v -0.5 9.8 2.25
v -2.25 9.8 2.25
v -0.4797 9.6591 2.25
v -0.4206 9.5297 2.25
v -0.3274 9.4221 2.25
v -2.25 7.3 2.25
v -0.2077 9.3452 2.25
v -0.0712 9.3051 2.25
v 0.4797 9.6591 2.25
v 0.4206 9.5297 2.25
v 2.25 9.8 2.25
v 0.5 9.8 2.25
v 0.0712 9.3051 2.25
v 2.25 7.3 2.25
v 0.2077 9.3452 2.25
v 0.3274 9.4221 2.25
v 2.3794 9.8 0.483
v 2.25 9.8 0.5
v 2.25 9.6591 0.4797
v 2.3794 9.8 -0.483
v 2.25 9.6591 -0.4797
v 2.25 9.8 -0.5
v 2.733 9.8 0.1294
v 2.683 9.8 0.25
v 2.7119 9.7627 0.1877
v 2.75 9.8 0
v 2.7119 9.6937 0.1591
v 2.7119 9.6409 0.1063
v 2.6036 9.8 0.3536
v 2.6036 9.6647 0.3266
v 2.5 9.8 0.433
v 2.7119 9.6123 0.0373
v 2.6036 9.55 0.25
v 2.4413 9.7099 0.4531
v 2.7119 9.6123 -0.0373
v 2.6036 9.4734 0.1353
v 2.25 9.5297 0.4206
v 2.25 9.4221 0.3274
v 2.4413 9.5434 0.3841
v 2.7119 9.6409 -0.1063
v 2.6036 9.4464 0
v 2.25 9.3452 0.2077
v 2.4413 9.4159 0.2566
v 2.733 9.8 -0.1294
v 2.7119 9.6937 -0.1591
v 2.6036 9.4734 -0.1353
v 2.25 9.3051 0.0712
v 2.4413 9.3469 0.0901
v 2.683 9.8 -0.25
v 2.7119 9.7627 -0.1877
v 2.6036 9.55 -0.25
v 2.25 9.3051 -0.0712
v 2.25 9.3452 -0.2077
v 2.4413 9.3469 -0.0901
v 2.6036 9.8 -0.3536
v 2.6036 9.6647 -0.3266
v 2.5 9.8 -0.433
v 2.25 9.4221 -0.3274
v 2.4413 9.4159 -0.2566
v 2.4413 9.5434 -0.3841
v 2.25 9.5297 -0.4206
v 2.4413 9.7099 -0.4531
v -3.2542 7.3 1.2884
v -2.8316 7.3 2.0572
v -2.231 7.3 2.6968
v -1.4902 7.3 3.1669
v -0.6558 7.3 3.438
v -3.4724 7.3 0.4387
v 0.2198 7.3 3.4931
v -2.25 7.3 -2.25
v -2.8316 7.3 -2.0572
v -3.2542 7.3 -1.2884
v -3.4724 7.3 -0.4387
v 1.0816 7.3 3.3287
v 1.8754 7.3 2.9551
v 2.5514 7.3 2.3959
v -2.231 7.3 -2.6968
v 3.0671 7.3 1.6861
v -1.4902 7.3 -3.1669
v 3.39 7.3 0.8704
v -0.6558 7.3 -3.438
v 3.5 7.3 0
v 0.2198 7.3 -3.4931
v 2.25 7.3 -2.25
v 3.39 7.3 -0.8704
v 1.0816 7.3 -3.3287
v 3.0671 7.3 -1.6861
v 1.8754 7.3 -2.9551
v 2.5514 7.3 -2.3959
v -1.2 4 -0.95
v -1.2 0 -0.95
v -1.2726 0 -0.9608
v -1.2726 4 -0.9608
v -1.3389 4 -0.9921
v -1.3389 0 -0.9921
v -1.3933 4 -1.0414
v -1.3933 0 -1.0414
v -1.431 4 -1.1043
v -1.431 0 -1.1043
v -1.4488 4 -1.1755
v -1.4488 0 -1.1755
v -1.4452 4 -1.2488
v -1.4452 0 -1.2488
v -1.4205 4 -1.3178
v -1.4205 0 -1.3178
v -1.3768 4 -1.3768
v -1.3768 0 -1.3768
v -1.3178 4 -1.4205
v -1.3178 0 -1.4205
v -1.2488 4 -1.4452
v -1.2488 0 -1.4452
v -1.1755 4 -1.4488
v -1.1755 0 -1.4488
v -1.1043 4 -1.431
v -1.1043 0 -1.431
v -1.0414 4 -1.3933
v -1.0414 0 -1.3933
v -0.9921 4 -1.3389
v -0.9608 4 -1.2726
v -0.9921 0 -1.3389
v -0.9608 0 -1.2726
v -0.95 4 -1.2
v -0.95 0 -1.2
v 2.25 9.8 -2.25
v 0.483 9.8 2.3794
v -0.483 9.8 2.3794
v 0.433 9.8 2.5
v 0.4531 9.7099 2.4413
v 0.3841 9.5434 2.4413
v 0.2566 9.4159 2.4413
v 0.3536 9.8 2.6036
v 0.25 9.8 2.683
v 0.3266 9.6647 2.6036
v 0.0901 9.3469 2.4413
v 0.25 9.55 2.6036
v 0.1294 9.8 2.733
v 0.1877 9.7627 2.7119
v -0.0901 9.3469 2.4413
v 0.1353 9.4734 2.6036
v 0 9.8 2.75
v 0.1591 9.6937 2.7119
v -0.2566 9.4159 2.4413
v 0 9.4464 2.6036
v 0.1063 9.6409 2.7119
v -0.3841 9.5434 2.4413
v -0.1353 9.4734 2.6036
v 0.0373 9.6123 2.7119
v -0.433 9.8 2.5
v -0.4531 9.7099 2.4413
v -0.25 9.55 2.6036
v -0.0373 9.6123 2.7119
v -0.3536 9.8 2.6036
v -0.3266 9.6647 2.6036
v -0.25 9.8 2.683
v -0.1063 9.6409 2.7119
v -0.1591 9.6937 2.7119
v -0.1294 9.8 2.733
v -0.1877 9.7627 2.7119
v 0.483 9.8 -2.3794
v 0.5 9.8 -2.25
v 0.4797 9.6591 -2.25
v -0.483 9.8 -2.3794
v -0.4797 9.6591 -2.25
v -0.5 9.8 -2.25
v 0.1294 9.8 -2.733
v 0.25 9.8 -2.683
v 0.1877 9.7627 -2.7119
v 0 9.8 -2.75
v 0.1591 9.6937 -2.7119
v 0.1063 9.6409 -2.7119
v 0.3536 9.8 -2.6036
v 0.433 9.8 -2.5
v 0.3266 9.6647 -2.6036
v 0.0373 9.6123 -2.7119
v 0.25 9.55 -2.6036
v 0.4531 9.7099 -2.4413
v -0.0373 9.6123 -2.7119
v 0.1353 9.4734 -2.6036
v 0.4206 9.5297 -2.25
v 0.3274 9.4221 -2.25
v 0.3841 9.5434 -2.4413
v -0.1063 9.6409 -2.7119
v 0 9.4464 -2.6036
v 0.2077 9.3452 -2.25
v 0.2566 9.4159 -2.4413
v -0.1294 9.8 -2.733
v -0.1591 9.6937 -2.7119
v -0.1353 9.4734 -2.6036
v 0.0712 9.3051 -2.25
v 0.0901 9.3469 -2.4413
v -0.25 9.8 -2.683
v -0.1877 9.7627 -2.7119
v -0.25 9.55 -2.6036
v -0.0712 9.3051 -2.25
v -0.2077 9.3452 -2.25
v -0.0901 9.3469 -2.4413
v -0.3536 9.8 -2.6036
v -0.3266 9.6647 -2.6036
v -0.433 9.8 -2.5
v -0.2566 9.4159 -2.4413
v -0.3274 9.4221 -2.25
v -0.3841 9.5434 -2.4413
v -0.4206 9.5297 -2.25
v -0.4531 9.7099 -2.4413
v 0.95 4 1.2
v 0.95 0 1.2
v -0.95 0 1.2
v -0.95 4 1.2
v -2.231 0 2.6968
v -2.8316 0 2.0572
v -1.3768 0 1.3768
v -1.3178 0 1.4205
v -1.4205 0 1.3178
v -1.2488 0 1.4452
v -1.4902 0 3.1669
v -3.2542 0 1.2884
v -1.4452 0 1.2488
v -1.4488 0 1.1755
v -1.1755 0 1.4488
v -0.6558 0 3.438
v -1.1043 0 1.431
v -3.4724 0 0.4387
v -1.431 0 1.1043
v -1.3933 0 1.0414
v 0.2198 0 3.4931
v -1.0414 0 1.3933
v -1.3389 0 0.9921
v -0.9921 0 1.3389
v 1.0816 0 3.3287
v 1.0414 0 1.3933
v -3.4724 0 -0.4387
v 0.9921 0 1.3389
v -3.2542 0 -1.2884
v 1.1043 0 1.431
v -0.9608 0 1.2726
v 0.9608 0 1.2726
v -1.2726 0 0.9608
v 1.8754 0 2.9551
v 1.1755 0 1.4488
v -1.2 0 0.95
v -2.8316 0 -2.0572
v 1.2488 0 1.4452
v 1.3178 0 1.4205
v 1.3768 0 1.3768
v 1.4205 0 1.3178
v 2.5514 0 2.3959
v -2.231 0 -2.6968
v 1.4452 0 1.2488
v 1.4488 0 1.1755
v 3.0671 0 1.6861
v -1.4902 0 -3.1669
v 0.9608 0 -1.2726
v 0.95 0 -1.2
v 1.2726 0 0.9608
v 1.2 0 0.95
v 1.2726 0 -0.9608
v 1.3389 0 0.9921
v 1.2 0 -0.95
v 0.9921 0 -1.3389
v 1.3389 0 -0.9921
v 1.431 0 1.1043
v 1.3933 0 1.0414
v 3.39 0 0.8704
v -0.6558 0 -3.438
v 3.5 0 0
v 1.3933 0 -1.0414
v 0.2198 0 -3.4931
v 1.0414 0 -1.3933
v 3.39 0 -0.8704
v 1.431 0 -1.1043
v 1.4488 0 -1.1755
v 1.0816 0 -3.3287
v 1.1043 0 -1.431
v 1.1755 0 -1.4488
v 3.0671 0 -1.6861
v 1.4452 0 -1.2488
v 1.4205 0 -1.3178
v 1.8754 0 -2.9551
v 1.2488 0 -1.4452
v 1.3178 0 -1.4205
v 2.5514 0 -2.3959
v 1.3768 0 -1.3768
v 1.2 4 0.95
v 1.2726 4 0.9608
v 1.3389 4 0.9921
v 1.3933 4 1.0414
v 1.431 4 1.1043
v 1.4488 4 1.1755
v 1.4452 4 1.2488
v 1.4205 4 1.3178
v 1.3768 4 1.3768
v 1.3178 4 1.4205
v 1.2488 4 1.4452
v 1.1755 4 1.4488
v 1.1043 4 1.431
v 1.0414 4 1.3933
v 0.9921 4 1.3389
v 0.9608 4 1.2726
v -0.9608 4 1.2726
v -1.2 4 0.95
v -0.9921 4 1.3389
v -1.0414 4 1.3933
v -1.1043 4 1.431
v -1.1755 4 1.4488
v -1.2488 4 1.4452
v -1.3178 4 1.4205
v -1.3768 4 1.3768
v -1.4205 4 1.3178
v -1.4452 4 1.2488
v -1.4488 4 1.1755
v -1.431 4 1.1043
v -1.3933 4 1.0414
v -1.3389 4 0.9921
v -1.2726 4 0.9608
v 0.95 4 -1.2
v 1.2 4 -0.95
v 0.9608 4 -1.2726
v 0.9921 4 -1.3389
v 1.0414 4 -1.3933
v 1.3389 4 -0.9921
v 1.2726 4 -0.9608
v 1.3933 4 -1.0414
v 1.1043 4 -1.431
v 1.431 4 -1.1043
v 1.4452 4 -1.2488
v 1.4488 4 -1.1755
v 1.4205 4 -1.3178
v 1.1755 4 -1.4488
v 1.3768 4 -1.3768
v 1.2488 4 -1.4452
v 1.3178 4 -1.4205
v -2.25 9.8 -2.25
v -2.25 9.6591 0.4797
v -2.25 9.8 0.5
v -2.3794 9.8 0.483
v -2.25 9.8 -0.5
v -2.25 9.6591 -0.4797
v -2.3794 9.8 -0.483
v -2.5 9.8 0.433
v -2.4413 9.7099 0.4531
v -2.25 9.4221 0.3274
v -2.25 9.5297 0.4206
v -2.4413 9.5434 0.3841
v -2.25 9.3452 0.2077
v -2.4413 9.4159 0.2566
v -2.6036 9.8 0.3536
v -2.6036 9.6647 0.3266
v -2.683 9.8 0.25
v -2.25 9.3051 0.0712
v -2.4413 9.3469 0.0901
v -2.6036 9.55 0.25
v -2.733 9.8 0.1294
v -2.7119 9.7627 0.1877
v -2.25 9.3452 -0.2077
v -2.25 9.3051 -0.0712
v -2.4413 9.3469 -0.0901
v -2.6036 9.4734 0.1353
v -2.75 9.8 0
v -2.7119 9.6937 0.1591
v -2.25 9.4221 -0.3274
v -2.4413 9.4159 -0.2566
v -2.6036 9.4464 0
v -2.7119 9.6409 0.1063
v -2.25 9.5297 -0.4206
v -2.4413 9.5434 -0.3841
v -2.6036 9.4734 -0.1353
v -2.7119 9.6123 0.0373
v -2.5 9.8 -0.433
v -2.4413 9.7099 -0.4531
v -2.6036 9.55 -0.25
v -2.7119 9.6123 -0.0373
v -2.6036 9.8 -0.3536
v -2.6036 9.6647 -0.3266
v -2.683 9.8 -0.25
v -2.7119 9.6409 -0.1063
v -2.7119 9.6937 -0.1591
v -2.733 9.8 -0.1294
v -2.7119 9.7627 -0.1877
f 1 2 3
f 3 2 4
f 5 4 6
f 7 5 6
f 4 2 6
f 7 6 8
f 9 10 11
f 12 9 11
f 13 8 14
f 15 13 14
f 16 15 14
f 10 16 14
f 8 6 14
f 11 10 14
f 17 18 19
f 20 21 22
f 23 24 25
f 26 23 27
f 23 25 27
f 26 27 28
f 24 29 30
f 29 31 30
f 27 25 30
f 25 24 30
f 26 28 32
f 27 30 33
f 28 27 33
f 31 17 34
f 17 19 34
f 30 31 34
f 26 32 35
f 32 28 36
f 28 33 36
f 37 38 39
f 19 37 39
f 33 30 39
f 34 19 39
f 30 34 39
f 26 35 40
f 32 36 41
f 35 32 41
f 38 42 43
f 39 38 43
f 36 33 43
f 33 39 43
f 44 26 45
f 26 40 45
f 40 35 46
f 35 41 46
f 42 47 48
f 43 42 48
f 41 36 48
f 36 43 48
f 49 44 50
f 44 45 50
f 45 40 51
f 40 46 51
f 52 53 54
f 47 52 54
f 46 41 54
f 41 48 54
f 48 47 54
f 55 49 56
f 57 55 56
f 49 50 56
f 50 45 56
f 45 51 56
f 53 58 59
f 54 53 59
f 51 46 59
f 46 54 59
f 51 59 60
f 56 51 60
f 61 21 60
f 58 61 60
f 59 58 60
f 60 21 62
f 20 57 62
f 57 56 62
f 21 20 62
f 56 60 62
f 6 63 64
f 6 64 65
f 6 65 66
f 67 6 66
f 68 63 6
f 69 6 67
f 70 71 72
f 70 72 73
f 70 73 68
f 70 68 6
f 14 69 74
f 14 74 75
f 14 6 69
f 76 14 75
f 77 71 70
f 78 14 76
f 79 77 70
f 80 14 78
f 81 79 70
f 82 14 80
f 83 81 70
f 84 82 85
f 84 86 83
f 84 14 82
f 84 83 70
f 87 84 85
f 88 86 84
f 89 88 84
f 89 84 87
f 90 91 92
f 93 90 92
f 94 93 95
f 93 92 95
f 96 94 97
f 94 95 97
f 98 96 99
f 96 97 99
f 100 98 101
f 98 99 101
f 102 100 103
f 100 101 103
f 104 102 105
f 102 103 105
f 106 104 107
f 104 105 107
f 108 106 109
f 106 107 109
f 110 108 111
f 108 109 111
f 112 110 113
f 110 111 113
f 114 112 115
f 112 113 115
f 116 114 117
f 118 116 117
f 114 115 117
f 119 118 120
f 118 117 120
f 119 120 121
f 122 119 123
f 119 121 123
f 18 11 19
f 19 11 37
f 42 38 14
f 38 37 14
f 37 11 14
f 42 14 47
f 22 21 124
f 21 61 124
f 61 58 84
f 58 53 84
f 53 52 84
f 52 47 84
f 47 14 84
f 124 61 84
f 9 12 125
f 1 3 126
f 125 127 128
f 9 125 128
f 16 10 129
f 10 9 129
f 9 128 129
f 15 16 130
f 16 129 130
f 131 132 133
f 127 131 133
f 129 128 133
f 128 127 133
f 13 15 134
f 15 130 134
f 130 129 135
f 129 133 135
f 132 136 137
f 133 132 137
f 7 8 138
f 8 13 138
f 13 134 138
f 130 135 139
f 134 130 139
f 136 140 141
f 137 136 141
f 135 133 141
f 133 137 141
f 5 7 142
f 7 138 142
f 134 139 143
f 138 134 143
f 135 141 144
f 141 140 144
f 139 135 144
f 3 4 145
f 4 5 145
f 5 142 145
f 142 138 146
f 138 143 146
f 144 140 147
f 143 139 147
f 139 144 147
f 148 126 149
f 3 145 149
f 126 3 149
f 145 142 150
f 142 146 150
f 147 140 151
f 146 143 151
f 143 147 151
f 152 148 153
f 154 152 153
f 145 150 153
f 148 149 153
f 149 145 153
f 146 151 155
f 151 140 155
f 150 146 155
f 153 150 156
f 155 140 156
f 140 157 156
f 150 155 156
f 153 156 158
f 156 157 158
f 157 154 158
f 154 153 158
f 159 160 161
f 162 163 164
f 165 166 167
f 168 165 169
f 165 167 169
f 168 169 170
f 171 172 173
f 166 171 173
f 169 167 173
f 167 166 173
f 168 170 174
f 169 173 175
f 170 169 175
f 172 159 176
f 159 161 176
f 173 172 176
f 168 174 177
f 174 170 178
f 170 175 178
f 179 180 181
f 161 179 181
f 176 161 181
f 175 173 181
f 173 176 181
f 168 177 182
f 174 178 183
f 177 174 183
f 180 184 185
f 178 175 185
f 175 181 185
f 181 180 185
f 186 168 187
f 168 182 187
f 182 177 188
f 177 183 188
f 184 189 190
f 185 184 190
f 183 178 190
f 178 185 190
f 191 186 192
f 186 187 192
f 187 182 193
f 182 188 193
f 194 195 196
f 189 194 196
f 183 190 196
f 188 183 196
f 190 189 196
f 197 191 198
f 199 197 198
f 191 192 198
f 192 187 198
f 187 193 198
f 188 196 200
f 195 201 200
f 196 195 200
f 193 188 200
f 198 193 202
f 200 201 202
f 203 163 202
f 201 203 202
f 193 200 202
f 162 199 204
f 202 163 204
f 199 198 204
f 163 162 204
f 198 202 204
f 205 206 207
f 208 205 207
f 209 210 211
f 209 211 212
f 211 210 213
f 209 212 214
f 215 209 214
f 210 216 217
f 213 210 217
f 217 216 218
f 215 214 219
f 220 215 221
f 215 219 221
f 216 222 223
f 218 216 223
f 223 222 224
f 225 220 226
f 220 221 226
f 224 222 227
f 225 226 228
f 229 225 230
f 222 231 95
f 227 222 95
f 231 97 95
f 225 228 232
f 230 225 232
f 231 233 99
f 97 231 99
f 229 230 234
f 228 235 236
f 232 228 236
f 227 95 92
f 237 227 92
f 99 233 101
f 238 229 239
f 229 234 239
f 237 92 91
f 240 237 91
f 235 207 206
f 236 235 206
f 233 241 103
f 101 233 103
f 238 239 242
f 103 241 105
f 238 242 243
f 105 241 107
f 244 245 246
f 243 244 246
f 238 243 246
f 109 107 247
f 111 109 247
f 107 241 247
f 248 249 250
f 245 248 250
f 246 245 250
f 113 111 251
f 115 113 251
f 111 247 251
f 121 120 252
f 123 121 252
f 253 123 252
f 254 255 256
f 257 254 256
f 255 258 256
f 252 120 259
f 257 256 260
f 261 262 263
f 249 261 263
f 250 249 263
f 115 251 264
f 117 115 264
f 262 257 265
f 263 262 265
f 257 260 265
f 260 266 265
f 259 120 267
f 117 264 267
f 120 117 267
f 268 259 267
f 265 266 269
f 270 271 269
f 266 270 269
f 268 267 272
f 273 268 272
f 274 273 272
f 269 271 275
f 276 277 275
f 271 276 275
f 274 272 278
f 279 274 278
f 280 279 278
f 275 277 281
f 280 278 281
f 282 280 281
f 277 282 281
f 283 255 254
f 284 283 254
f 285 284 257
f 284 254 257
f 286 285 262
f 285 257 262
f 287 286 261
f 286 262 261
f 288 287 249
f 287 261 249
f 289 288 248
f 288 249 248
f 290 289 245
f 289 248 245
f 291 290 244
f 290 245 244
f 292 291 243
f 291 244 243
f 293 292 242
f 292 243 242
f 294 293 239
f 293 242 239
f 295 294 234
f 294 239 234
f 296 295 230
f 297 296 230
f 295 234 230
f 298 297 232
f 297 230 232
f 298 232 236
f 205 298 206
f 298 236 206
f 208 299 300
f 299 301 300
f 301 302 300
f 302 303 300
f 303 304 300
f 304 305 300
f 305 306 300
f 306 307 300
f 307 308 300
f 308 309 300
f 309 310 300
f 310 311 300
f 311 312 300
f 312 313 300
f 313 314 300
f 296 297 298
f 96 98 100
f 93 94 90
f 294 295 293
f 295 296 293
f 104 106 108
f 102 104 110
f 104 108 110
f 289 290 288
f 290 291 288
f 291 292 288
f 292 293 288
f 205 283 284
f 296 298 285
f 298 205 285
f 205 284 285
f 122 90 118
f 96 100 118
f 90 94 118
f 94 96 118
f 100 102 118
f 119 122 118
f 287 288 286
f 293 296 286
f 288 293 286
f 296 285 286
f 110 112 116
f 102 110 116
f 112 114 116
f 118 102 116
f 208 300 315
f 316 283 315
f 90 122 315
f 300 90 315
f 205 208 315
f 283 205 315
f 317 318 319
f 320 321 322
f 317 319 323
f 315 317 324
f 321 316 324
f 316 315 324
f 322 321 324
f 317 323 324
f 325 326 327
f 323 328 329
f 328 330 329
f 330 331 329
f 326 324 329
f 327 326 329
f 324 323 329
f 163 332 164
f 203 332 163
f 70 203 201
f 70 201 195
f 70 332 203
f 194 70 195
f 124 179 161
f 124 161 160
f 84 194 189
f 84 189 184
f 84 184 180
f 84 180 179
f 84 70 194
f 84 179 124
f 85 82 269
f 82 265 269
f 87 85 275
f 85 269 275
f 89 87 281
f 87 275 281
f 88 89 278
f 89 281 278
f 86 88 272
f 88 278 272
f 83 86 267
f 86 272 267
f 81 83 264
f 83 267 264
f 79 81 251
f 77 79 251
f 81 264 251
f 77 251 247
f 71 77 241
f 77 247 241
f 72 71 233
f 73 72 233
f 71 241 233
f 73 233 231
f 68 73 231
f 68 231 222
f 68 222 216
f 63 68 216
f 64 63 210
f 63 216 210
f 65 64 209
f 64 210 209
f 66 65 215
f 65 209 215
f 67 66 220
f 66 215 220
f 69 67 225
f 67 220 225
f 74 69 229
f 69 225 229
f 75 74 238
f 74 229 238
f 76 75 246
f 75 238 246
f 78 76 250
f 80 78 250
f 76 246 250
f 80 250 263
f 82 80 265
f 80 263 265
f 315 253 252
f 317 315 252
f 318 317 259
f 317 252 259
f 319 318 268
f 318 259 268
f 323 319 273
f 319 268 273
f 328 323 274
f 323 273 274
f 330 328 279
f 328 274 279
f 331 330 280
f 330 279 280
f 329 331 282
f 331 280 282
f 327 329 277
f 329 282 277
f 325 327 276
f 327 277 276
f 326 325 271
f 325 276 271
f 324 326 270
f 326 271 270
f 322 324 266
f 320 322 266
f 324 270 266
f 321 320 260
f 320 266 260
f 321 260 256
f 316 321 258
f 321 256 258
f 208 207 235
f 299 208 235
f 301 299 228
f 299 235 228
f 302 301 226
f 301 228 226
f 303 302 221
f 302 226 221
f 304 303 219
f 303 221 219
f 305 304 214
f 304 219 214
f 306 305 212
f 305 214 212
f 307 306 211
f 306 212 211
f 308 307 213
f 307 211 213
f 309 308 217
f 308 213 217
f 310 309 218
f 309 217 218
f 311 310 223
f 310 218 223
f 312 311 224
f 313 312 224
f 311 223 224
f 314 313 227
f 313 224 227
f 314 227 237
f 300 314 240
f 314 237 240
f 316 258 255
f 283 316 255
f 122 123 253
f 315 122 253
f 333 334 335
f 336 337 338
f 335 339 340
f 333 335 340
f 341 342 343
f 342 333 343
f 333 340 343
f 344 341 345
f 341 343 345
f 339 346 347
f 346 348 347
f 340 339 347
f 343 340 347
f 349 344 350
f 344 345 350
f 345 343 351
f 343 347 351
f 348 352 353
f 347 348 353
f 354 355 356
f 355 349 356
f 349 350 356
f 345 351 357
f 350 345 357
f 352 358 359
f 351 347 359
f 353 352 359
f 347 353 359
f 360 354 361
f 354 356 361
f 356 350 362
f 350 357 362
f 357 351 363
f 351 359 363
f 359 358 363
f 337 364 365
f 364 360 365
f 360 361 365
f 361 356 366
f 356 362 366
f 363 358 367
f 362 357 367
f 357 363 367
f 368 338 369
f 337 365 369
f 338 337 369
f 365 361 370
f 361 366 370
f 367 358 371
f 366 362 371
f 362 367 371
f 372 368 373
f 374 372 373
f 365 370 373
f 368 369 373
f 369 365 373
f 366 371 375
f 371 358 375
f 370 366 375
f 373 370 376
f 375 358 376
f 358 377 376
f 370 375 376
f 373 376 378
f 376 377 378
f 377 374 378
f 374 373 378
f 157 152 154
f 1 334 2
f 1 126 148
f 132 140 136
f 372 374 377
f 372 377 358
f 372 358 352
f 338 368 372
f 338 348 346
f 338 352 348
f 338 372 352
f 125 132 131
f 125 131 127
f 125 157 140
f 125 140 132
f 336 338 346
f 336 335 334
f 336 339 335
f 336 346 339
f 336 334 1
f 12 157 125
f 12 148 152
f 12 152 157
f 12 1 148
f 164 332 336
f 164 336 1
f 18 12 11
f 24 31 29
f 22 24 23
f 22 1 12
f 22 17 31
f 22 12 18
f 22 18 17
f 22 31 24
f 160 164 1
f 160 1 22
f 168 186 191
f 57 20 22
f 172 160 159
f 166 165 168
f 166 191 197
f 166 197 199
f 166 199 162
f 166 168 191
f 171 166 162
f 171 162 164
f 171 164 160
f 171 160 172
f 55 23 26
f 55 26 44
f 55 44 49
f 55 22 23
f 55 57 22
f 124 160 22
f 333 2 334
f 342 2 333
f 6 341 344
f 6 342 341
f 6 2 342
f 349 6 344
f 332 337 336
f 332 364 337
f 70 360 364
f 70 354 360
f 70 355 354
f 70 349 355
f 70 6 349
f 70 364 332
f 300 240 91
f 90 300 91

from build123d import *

# Parameters (mm, degrees)
SKETCH_1_R          = 3.5
EXTRUDE_1_DEPTH     = 4
SKETCH_3_R          = 3.5
EXTRUDE_2_DEPTH     = 3.3
SKETCH_4_W          = 4.5
SKETCH_4_H          = 4.5
EXTRUDE_3_DEPTH     = 2.5
SKETCH_7_R          = 3.5
CUT_EXTRUDE_1_DEPTH = 10


with BuildPart() as part:
    # 草图1 → 凸台-拉伸1 (new body)
    with BuildSketch(Plane(origin=(0, 0, 0), x_dir=(1, 0, 0), z_dir=(0, 1, 0))):
        Circle(SKETCH_1_R)
        with BuildLine():
            Line((0.95, -1.2), (-0.95, -1.2))
            ThreePointArc((-0.95, -1.2), (-1.376776695, -1.376776695), (-1.2, -0.95))
            Line((-1.2, -0.95), (-1.2, 0.95))
            ThreePointArc((-1.2, 0.95), (-1.376776695, 1.376776695), (-0.95, 1.2))
            Line((-0.95, 1.2), (0.95, 1.2))
            ThreePointArc((0.95, 1.2), (1.376776695, 1.376776695), (1.2, 0.95))
            Line((1.2, 0.95), (1.2, -0.95))
            ThreePointArc((1.2, -0.95), (1.376776695, -1.376776695), (0.95, -1.2))
        make_face(mode=Mode.SUBTRACT)
    extrude(amount=EXTRUDE_1_DEPTH)

    # 草图3 → 凸台-拉伸2 (add)
    with BuildSketch(Plane(origin=(0, 4, 0), x_dir=(1, 0, 0), z_dir=(0, 1, 0))):
        Circle(SKETCH_3_R)
    extrude(amount=EXTRUDE_2_DEPTH)

    # 草图4 → 凸台-拉伸3 (add)
    with BuildSketch(Plane(origin=(0, 7.3, 0), x_dir=(1, 0, 0), z_dir=(0, 1, 0))):
        Rectangle(SKETCH_4_W, SKETCH_4_H)
    extrude(amount=EXTRUDE_3_DEPTH)

    # 草图5 → 旋转1 (revolve)
    with BuildSketch(Plane(origin=(0, 9.8, 0), x_dir=(1, 0, 0), z_dir=(0, 1, 0))):
        with BuildLine():
            Line((-2.75, 0), (-1.75, 0))
            ThreePointArc((-1.75, 0), (-2.25, -0.5), (-2.75, 0))
        make_face()
        with BuildLine():
            Line((1.75, 0), (2.75, 0))
            ThreePointArc((2.75, 0), (2.25, -0.5), (1.75, 0))
        make_face()
    revolve(axis=Axis((-2.75, 9.8, 0), (1, 0, 0)))

    # 草图6 → 旋转2 (revolve)
    with BuildSketch(Plane(origin=(0, 9.8, 0), x_dir=(1, 0, 0), z_dir=(0, 1, 0))):
        with BuildLine():
            Line((0, -2.75), (0, -1.75))
            ThreePointArc((0, -1.75), (-0.5, -2.25), (0, -2.75))
        make_face()
        with BuildLine():
            Line((0, 1.75), (0, 2.75))
            ThreePointArc((0, 2.75), (-0.5, 2.25), (0, 1.75))
        make_face()
    revolve(axis=Axis((0, 9.8, 2.75), (0, 0, -1)))

    # 草图7 → 切除-拉伸1 (cut)
    with BuildSketch(Plane(origin=(0, 9.8, 0), x_dir=(1, 0, 0), z_dir=(0, 1, 0))):
        Circle(SKETCH_7_R)
    extrude(amount=CUT_EXTRUDE_1_DEPTH, mode=Mode.SUBTRACT)


solid = part.part
